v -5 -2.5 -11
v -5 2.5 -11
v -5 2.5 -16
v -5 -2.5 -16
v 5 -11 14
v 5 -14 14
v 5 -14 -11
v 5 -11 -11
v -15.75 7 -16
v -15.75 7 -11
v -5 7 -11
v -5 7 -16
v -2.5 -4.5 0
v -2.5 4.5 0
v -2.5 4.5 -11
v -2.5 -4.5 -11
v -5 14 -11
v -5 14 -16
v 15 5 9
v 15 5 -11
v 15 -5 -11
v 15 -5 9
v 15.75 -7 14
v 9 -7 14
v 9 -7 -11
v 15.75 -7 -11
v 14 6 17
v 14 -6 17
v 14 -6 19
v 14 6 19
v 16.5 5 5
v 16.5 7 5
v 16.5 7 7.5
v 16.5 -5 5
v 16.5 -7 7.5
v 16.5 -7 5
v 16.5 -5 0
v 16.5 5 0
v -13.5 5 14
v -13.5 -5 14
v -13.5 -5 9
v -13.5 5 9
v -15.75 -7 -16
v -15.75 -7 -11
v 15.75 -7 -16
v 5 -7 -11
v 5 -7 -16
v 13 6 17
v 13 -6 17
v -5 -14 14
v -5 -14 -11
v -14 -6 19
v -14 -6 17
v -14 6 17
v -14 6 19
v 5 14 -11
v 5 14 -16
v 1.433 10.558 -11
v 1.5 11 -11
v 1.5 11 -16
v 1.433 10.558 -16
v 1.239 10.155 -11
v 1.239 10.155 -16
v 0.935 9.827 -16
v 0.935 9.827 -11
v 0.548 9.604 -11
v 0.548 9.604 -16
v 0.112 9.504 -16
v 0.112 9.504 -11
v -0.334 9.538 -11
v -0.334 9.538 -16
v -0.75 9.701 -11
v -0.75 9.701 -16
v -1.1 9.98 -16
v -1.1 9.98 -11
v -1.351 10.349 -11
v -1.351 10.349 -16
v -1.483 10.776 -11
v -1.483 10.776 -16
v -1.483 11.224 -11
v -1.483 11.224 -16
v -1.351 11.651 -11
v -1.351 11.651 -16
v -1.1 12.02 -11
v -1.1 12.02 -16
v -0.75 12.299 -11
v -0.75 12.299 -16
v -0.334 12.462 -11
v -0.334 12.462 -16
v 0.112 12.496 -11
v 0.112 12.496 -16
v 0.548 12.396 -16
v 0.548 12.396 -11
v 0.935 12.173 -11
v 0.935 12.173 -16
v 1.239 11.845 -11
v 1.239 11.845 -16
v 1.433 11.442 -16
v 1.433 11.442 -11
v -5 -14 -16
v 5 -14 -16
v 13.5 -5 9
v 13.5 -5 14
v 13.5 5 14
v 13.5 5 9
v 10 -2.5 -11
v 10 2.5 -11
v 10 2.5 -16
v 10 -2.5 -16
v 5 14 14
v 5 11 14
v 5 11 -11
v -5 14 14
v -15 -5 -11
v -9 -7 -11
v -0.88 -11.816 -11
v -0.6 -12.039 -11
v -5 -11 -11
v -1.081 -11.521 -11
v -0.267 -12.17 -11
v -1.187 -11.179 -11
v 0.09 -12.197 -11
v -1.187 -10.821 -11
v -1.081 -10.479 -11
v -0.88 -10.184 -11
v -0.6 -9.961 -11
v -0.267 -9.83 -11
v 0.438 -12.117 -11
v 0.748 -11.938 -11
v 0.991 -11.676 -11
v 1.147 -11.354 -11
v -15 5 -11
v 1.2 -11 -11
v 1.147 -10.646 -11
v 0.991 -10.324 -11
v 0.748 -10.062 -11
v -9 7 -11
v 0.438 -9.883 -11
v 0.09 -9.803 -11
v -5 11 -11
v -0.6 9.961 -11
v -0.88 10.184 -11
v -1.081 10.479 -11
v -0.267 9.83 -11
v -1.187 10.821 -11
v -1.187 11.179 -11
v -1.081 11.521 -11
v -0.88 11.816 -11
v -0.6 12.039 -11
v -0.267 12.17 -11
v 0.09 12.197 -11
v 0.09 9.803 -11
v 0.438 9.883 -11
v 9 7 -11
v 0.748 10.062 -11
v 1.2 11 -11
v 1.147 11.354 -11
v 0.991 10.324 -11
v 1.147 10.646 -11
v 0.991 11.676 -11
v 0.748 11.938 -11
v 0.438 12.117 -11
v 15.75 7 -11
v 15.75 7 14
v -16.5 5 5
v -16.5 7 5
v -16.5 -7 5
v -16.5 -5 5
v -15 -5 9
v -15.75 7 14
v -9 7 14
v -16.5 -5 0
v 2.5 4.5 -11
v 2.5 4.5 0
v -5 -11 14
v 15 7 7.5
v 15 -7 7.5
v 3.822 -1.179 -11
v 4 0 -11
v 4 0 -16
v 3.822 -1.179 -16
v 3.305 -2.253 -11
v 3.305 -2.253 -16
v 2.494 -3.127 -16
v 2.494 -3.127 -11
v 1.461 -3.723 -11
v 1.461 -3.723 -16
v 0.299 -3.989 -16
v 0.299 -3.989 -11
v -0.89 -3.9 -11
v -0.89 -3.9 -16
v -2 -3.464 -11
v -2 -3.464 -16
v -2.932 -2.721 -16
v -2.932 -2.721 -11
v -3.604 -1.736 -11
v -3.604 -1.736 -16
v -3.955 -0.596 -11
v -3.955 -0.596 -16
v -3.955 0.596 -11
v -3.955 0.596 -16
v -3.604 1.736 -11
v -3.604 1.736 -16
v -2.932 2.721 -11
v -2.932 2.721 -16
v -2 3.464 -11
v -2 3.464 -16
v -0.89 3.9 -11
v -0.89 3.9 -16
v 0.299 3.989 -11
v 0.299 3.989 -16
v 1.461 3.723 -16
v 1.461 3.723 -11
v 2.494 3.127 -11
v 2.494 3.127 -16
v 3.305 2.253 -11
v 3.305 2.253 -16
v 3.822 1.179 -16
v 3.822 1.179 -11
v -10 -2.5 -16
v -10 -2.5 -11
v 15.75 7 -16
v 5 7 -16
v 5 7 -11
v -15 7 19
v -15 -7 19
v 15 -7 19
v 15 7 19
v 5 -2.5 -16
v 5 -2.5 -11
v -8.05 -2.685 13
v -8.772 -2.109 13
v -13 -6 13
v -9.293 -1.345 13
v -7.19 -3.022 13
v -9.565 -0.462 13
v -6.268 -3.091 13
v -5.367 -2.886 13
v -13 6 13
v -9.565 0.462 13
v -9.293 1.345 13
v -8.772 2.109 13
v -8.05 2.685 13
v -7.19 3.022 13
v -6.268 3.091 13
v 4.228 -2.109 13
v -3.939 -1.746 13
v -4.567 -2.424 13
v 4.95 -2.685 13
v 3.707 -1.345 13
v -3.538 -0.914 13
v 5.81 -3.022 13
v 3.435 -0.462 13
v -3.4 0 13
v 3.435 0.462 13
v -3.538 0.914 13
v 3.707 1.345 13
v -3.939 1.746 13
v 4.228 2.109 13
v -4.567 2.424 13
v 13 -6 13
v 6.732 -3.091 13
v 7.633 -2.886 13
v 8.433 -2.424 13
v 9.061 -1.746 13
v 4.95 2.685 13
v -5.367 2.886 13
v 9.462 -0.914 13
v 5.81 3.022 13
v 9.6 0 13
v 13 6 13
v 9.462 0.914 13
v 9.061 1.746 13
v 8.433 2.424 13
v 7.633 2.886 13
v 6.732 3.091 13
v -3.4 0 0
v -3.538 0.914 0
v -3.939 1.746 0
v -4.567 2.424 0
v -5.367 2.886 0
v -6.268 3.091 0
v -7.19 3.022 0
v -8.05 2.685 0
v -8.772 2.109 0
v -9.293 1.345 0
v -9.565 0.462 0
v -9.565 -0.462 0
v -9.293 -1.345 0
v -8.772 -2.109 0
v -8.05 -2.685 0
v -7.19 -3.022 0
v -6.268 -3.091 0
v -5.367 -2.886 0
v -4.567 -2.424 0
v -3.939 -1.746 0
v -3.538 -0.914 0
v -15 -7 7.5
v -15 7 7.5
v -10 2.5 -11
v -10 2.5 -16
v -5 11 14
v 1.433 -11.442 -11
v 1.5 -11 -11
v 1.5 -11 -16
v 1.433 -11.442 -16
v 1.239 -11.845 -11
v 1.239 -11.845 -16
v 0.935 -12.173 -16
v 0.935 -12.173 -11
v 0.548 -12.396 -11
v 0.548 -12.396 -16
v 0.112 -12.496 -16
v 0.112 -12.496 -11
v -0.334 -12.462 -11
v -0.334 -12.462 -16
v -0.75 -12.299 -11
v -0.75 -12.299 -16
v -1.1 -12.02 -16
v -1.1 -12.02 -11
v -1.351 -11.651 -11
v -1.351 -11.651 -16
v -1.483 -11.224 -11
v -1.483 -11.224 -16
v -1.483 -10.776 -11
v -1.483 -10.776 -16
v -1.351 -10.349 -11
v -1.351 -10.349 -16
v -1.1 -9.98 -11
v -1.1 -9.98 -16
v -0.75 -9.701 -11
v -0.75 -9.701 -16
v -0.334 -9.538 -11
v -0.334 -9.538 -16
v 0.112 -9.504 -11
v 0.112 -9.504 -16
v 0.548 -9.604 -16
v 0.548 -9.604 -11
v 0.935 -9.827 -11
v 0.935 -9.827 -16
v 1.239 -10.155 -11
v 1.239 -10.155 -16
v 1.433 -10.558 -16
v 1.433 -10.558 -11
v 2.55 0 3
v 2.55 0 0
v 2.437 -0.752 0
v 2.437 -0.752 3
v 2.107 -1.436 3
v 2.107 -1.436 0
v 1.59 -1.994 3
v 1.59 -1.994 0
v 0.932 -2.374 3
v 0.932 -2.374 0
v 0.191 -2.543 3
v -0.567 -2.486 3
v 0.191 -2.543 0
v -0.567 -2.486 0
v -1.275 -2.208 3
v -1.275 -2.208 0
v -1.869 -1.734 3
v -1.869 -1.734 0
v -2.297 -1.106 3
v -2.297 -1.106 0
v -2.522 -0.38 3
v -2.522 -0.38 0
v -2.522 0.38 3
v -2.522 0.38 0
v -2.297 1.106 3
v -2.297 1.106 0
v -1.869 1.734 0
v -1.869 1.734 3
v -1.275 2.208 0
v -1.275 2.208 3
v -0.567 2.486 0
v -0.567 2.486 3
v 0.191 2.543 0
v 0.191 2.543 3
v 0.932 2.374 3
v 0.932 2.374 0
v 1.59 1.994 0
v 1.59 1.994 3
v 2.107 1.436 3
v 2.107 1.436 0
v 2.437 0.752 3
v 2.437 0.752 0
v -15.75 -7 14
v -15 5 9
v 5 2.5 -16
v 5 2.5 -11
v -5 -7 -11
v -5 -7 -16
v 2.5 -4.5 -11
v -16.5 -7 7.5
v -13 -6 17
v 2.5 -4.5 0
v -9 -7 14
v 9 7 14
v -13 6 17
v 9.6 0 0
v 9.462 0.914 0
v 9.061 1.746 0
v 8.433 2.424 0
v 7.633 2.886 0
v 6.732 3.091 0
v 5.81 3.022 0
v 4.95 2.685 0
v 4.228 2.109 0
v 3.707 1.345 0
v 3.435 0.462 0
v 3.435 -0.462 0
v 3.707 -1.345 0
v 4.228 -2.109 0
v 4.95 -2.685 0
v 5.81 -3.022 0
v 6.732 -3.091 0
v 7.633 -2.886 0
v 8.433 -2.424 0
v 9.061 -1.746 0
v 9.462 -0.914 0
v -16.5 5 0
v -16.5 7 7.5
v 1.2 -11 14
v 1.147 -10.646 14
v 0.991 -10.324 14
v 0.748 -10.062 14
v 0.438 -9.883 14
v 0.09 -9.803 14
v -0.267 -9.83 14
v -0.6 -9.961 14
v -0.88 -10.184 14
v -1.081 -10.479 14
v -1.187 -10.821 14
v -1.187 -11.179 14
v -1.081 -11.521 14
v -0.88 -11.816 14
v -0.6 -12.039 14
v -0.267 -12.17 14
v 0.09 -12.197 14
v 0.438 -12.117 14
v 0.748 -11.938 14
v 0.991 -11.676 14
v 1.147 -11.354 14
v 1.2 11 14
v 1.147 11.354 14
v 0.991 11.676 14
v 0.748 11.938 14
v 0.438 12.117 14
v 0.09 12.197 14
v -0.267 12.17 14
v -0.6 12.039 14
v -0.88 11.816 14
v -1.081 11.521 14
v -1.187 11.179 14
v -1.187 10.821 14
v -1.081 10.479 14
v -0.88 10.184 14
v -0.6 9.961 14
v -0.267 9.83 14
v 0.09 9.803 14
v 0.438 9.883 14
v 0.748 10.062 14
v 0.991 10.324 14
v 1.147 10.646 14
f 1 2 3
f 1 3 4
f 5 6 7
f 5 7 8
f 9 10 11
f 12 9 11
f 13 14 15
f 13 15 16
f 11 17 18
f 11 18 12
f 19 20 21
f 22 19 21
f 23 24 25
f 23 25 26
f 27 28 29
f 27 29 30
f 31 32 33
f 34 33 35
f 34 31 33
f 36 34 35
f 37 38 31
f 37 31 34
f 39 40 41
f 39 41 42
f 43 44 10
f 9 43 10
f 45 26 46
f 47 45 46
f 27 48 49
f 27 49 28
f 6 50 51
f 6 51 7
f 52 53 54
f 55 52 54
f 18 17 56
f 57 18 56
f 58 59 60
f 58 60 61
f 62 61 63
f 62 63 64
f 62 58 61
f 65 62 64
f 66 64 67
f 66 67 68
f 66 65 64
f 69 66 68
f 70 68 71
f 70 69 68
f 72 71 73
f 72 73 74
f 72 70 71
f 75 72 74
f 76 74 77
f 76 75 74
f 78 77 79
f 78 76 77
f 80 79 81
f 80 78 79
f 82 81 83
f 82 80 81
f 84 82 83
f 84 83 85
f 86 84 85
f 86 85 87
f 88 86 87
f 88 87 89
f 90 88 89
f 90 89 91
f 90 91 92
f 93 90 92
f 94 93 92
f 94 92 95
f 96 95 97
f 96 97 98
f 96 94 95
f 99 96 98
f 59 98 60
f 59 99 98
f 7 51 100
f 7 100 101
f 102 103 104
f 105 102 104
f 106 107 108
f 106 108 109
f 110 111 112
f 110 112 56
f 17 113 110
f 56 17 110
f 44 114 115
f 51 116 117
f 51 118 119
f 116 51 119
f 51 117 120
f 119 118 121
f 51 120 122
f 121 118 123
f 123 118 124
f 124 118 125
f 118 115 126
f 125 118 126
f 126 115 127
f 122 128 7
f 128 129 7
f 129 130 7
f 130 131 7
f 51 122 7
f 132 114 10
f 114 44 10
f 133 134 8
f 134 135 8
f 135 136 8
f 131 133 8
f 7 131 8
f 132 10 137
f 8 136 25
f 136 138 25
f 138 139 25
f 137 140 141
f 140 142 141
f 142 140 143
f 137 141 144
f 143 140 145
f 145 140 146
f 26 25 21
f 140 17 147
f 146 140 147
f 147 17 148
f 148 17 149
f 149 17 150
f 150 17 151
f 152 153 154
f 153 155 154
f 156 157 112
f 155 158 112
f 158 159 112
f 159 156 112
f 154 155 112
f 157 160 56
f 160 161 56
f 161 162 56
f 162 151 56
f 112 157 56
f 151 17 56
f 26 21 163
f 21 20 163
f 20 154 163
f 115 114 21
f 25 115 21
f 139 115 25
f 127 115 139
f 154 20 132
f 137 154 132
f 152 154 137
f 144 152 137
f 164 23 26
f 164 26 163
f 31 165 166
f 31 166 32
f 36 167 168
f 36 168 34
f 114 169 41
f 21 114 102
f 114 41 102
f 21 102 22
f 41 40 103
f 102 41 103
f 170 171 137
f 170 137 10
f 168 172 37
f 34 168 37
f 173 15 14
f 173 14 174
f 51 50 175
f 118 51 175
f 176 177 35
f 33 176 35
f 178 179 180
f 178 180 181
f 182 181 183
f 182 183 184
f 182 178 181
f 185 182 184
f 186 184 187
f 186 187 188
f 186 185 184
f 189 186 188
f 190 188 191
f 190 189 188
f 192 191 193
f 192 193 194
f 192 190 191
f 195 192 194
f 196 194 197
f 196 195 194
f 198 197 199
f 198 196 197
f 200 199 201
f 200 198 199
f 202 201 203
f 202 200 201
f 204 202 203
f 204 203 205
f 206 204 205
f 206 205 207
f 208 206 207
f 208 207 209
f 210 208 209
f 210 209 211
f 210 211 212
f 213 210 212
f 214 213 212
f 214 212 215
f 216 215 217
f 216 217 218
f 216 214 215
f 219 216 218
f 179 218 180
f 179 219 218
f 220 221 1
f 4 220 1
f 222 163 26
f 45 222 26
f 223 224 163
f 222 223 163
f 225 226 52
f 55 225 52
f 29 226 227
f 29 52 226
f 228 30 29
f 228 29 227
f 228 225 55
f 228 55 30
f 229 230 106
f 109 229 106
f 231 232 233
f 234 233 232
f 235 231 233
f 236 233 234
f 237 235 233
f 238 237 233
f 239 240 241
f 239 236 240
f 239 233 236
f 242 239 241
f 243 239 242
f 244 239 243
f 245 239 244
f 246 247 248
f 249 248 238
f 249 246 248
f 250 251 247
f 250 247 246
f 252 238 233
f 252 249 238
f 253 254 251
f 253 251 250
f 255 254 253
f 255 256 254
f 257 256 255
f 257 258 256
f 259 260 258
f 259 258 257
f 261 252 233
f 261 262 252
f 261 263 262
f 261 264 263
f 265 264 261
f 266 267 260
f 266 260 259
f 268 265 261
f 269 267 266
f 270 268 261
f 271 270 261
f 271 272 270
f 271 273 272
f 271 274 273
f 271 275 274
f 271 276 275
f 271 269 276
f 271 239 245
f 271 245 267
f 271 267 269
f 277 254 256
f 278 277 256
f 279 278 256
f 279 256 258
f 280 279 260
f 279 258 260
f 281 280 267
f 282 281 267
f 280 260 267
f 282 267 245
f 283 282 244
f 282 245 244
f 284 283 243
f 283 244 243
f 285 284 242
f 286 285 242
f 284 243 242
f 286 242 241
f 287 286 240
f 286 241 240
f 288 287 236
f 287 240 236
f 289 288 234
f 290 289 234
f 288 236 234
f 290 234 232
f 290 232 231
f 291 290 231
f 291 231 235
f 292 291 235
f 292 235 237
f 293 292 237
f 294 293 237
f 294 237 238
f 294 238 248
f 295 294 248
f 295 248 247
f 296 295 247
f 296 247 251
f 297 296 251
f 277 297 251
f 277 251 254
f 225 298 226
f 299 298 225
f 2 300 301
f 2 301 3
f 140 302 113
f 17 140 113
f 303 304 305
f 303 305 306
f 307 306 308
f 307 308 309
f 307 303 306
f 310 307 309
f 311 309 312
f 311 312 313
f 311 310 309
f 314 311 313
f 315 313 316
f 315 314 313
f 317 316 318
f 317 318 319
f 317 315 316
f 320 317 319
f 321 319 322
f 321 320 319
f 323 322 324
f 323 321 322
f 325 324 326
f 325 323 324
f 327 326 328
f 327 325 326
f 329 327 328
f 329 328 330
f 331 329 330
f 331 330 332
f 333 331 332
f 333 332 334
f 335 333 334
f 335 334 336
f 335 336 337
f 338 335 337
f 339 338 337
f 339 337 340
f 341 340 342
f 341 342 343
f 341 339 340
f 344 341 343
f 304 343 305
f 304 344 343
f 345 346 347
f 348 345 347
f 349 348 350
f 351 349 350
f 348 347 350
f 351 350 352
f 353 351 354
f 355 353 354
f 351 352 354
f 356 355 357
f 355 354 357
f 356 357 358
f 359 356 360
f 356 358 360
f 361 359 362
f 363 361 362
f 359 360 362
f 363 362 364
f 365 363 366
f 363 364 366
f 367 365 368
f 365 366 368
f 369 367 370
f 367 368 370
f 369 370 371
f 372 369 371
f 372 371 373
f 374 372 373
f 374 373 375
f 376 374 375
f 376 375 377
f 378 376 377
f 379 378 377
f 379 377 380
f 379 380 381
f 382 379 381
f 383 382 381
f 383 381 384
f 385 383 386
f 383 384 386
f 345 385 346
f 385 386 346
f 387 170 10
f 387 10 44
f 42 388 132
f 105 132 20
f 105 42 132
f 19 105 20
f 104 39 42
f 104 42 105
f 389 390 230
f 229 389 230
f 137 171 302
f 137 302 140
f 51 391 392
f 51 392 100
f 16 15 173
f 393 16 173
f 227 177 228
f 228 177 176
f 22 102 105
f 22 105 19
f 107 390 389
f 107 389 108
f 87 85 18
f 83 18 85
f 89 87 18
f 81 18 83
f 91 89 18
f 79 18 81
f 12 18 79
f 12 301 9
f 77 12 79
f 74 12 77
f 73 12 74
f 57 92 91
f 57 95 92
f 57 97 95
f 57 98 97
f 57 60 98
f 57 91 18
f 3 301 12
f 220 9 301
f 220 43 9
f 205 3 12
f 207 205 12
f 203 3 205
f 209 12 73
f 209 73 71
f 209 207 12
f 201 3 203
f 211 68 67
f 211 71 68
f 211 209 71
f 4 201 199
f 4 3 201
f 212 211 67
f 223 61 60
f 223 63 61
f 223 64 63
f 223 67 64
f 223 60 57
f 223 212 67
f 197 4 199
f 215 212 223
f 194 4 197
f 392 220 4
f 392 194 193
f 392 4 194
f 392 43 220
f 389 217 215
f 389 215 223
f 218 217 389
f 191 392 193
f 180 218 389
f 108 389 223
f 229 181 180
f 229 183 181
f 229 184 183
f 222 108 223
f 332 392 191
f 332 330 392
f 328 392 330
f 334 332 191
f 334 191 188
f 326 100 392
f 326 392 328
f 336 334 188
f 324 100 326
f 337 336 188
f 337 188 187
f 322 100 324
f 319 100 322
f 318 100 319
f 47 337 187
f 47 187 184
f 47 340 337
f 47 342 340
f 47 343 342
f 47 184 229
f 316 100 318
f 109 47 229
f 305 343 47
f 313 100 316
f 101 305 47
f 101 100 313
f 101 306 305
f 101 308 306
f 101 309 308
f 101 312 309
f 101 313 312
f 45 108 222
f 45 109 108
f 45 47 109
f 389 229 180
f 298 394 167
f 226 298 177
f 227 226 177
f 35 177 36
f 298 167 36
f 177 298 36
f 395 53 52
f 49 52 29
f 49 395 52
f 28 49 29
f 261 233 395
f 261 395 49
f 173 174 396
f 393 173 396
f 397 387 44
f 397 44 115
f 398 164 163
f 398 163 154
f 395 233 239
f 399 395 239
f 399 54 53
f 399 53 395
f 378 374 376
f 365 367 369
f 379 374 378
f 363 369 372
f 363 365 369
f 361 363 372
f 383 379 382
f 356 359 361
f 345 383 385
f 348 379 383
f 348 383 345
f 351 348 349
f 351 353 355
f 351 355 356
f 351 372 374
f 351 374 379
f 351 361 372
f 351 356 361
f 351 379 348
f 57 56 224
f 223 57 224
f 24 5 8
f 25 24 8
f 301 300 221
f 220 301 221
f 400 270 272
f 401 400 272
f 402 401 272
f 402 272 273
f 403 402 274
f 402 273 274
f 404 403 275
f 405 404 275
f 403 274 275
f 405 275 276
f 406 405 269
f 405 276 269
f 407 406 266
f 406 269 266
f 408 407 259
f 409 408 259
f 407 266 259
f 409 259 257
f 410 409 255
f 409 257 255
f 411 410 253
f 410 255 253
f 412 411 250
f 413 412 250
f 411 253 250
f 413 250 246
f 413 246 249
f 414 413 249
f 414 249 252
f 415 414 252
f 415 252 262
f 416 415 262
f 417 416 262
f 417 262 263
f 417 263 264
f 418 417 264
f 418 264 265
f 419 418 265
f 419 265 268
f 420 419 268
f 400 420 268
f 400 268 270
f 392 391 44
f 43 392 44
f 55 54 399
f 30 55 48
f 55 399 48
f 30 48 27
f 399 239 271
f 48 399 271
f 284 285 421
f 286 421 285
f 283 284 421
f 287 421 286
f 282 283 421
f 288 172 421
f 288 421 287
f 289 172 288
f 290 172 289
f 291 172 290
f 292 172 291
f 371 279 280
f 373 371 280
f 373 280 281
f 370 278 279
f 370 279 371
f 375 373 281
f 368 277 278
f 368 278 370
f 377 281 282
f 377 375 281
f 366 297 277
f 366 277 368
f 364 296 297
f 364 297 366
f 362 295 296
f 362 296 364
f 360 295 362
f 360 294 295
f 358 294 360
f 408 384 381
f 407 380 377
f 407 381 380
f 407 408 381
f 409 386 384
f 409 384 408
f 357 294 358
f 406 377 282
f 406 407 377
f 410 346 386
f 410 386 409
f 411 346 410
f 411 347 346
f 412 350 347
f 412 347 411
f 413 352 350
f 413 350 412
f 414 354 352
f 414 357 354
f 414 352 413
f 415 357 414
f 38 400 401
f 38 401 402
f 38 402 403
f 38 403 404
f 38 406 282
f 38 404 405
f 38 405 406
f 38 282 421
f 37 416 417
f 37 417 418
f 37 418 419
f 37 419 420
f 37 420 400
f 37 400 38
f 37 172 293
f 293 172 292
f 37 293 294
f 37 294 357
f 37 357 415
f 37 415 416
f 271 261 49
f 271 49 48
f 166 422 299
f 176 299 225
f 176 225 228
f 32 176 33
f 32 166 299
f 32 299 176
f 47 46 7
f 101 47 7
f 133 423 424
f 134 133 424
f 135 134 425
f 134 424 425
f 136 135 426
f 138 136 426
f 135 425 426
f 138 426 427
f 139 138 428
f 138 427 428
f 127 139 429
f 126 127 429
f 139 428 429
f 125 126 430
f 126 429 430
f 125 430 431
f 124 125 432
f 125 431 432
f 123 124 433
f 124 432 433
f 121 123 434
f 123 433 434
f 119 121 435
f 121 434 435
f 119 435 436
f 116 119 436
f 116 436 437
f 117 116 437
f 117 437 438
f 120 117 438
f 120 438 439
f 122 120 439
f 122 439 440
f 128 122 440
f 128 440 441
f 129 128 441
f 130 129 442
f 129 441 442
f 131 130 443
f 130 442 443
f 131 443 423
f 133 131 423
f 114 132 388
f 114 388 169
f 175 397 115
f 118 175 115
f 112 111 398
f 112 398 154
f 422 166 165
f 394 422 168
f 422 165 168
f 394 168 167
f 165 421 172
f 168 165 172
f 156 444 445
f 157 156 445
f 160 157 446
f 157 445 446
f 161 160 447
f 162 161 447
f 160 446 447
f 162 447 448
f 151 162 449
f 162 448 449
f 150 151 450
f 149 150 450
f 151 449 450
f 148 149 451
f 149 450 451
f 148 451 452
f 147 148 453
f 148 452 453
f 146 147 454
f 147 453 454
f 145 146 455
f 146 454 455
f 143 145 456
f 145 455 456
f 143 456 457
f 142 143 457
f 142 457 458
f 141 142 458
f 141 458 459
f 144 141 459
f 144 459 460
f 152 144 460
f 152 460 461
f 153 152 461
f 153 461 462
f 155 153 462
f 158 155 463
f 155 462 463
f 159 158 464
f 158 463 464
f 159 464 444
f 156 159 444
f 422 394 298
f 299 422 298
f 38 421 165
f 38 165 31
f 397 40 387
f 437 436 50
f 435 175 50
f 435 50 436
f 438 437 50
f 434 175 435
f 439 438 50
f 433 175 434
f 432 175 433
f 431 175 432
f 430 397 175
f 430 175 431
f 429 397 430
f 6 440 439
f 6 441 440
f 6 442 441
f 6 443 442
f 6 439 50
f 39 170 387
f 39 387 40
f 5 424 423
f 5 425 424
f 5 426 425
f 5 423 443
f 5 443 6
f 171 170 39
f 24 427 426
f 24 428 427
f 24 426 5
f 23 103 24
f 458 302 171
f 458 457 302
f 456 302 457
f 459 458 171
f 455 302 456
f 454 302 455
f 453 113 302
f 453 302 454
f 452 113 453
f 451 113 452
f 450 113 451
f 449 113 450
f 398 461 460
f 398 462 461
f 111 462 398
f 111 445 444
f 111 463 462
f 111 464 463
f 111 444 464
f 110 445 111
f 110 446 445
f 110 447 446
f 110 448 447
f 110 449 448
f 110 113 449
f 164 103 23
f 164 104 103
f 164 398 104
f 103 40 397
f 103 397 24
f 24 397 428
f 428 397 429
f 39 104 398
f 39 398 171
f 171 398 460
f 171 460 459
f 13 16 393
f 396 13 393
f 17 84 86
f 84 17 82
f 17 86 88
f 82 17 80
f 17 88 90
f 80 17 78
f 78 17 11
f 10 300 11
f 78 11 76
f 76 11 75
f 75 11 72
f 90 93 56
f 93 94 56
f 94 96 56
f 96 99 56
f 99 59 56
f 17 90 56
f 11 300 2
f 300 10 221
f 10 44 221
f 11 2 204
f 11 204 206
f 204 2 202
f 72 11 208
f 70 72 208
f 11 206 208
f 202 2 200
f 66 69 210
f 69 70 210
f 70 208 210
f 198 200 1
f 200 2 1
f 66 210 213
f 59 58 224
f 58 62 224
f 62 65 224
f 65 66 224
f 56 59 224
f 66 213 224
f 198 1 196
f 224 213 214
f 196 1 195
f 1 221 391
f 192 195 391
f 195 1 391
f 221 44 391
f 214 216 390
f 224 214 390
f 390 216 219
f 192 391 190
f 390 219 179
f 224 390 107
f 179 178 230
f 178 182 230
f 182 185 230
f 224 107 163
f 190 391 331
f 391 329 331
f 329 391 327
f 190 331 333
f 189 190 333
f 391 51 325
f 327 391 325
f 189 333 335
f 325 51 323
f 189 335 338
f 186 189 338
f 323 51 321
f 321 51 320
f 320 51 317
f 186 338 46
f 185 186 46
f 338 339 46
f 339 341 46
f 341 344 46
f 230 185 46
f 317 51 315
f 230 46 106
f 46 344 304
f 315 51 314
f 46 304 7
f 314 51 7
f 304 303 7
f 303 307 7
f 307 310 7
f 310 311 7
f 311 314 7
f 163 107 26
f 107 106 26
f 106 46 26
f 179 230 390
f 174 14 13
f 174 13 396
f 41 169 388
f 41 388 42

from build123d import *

# Parameters (mm, degrees)
F0_W      = 30
F0_H      = 14
F1_DEPTH  = 13
F2_W      = 30
F2_H      = 14
F2_W_2    = 28
F2_H_2    = 12
F3_DEPTH  = 6
F4_W      = 1
F4_H      = 12
F5_DEPTH  = 4
F6_R      = 3.1
F7_DEPTH  = 19
F8_W      = 1.5
F8_H      = 14
F9_DEPTH  = 7.5
F10_R     = 2.55
F11_DEPTH = 3
F13_W     = 27
F13_H     = 10
F13_W_2   = 10
F13_H_2   = 7
F14_DEPTH = 25
F15_W     = 30
F15_H     = 10
F16_DEPTH = 20
F17_R     = 1.2
F18_DEPTH = 25
F19_W     = 5
F19_H     = 5
F19_R     = 4
F19_W_2   = 10
F19_H_2   = 7
F19_R_2   = 1.5
F20_DEPTH = 5
F21_SIZE  = 4
F23_W     = 5
F23_H     = 9
F24_DEPTH = 11
F25_W     = 33
F25_H     = 2
F26_DEPTH = 5


with BuildPart() as f1:
    # F0 (on Top) → F1 (new body)
    with BuildSketch(Plane.XY):
        Rectangle(F0_W, F0_H)
    extrude(amount=F1_DEPTH)

    # F2 (on face) → F3 (join)
    with BuildSketch(Plane.XY.offset(13)):
        Rectangle(F2_W, F2_H)
        Rectangle(F2_W_2, F2_H_2, mode=Mode.SUBTRACT)
    extrude(amount=F3_DEPTH)

    # F4 (on face) → F5 (join)
    with BuildSketch(Plane.XY.offset(13)):
        with Locations((-13.5, 0)):
            Rectangle(F4_W, F4_H)
        with Locations((13.5, 0)):
            Rectangle(F4_W, F4_H)
    extrude(amount=F5_DEPTH)

    # F6 (on face) → F7 (cut)
    with BuildSketch(Plane.XY.offset(13)):
        with Locations((-6.5, 0)):
            Circle(F6_R)
        with Locations((6.5, 0)):
            Circle(F6_R)
    extrude(amount=-F7_DEPTH, mode=Mode.SUBTRACT)

    # F8 (on face) → F9 (join)
    with BuildSketch(Plane(origin=(0, 0, 0), x_dir=(1, 0, 0), z_dir=(0, 0, -1))):
        with Locations((-15.75, 0)):
            Rectangle(F8_W, F8_H)
        with Locations((15.75, 0)):
            Rectangle(F8_W, F8_H)
    extrude(amount=-F9_DEPTH)

    # F10 (on face) → F11 (cut)
    with BuildSketch(Plane(origin=(0, 0, 0), x_dir=(1, 0, 0), z_dir=(0, 0, -1))):
        Circle(F10_R)
    extrude(amount=-F11_DEPTH, mode=Mode.SUBTRACT)

    # F25 (on face) → F26 (cut)
    with BuildSketch(Plane(origin=(0, 0, 0), x_dir=(1, 0, 0), z_dir=(0, 0, -1))):
        with Locations((0, 6)):
            Rectangle(F25_W, F25_H)
        with Locations((0, -6)):
            Rectangle(F25_W, F25_H)
    extrude(amount=-F26_DEPTH, mode=Mode.SUBTRACT)


with BuildPart() as f14:
    # F13 (on offset) → F14 (new body)
    with BuildSketch(Plane.XY.offset(14)):
        Polygon((5, -7), (15.75, -7), (15.75, 7), (5, 7), (-5, 7), (-15.75, 7), (-15.75, -7), (-5, -7), align=None)
        Rectangle(F13_W, F13_H, mode=Mode.SUBTRACT)
        with Locations((0, -10.5)):
            Rectangle(F13_W_2, F13_H_2)
        with Locations((0, 10.5)):
            Rectangle(F13_W_2, F13_H_2)
    extrude(amount=-F14_DEPTH)

    # F15 (on face) → F16 (cut)
    with BuildSketch(Plane(origin=(0, 0, -11), x_dir=(1, 0, 0), z_dir=(0, 0, -1))):
        Rectangle(F15_W, F15_H)
    extrude(amount=-F16_DEPTH, mode=Mode.SUBTRACT)

    # F17 (on face) → F18 (cut)
    with BuildSketch(Plane.XY.offset(14)):
        with Locations((0, 11)):
            Circle(F17_R)
        with Locations((0, -11)):
            Circle(F17_R)
    extrude(amount=-F18_DEPTH, mode=Mode.SUBTRACT)

    # F21
    f21_edges = [f14.edges().sort_by_distance(p)[0] for p in [
        (-5, 7, 1.5),
        (5, 7, 1.5),
        (5, -7, 1.5),
        (-5, -7, 1.5),
    ]]
    chamfer(f21_edges, length=F21_SIZE)


with BuildPart() as f20:
    # F19 (on face) → F20 (new body)
    with BuildSketch(Plane(origin=(0, 0, -11), x_dir=(1, 0, 0), z_dir=(0, 0, -1))):
        Polygon((5, -7), (15.75, -7), (15.75, 7), (5, 7), (-5, 7), (-15.75, 7), (-15.75, -7), (-5, -7), align=None)
        with Locations((-7.5, 0)):
            Rectangle(F19_W, F19_H, mode=Mode.SUBTRACT)
        Circle(F19_R, mode=Mode.SUBTRACT)
        with Locations((7.5, 0)):
            Rectangle(F19_W, F19_H, mode=Mode.SUBTRACT)
        with Locations((0, -10.5)):
            Rectangle(F19_W_2, F19_H_2)
        with Locations((0, -11)):
            Circle(F19_R_2, mode=Mode.SUBTRACT)
        with Locations((0, 10.5)):
            Rectangle(F19_W_2, F19_H_2)
        with Locations((0, 11)):
            Circle(F19_R_2, mode=Mode.SUBTRACT)
    extrude(amount=F20_DEPTH)


with BuildPart() as f24:
    # F23 (on offset) → F24 (new body)
    with BuildSketch(Plane(origin=(0, 0, -11), x_dir=(1, 0, 0), z_dir=(0, 0, -1))):
        Rectangle(F23_W, F23_H)
    extrude(amount=-F24_DEPTH)


solid = Compound([f1.part, f14.part, f20.part, f24.part])
